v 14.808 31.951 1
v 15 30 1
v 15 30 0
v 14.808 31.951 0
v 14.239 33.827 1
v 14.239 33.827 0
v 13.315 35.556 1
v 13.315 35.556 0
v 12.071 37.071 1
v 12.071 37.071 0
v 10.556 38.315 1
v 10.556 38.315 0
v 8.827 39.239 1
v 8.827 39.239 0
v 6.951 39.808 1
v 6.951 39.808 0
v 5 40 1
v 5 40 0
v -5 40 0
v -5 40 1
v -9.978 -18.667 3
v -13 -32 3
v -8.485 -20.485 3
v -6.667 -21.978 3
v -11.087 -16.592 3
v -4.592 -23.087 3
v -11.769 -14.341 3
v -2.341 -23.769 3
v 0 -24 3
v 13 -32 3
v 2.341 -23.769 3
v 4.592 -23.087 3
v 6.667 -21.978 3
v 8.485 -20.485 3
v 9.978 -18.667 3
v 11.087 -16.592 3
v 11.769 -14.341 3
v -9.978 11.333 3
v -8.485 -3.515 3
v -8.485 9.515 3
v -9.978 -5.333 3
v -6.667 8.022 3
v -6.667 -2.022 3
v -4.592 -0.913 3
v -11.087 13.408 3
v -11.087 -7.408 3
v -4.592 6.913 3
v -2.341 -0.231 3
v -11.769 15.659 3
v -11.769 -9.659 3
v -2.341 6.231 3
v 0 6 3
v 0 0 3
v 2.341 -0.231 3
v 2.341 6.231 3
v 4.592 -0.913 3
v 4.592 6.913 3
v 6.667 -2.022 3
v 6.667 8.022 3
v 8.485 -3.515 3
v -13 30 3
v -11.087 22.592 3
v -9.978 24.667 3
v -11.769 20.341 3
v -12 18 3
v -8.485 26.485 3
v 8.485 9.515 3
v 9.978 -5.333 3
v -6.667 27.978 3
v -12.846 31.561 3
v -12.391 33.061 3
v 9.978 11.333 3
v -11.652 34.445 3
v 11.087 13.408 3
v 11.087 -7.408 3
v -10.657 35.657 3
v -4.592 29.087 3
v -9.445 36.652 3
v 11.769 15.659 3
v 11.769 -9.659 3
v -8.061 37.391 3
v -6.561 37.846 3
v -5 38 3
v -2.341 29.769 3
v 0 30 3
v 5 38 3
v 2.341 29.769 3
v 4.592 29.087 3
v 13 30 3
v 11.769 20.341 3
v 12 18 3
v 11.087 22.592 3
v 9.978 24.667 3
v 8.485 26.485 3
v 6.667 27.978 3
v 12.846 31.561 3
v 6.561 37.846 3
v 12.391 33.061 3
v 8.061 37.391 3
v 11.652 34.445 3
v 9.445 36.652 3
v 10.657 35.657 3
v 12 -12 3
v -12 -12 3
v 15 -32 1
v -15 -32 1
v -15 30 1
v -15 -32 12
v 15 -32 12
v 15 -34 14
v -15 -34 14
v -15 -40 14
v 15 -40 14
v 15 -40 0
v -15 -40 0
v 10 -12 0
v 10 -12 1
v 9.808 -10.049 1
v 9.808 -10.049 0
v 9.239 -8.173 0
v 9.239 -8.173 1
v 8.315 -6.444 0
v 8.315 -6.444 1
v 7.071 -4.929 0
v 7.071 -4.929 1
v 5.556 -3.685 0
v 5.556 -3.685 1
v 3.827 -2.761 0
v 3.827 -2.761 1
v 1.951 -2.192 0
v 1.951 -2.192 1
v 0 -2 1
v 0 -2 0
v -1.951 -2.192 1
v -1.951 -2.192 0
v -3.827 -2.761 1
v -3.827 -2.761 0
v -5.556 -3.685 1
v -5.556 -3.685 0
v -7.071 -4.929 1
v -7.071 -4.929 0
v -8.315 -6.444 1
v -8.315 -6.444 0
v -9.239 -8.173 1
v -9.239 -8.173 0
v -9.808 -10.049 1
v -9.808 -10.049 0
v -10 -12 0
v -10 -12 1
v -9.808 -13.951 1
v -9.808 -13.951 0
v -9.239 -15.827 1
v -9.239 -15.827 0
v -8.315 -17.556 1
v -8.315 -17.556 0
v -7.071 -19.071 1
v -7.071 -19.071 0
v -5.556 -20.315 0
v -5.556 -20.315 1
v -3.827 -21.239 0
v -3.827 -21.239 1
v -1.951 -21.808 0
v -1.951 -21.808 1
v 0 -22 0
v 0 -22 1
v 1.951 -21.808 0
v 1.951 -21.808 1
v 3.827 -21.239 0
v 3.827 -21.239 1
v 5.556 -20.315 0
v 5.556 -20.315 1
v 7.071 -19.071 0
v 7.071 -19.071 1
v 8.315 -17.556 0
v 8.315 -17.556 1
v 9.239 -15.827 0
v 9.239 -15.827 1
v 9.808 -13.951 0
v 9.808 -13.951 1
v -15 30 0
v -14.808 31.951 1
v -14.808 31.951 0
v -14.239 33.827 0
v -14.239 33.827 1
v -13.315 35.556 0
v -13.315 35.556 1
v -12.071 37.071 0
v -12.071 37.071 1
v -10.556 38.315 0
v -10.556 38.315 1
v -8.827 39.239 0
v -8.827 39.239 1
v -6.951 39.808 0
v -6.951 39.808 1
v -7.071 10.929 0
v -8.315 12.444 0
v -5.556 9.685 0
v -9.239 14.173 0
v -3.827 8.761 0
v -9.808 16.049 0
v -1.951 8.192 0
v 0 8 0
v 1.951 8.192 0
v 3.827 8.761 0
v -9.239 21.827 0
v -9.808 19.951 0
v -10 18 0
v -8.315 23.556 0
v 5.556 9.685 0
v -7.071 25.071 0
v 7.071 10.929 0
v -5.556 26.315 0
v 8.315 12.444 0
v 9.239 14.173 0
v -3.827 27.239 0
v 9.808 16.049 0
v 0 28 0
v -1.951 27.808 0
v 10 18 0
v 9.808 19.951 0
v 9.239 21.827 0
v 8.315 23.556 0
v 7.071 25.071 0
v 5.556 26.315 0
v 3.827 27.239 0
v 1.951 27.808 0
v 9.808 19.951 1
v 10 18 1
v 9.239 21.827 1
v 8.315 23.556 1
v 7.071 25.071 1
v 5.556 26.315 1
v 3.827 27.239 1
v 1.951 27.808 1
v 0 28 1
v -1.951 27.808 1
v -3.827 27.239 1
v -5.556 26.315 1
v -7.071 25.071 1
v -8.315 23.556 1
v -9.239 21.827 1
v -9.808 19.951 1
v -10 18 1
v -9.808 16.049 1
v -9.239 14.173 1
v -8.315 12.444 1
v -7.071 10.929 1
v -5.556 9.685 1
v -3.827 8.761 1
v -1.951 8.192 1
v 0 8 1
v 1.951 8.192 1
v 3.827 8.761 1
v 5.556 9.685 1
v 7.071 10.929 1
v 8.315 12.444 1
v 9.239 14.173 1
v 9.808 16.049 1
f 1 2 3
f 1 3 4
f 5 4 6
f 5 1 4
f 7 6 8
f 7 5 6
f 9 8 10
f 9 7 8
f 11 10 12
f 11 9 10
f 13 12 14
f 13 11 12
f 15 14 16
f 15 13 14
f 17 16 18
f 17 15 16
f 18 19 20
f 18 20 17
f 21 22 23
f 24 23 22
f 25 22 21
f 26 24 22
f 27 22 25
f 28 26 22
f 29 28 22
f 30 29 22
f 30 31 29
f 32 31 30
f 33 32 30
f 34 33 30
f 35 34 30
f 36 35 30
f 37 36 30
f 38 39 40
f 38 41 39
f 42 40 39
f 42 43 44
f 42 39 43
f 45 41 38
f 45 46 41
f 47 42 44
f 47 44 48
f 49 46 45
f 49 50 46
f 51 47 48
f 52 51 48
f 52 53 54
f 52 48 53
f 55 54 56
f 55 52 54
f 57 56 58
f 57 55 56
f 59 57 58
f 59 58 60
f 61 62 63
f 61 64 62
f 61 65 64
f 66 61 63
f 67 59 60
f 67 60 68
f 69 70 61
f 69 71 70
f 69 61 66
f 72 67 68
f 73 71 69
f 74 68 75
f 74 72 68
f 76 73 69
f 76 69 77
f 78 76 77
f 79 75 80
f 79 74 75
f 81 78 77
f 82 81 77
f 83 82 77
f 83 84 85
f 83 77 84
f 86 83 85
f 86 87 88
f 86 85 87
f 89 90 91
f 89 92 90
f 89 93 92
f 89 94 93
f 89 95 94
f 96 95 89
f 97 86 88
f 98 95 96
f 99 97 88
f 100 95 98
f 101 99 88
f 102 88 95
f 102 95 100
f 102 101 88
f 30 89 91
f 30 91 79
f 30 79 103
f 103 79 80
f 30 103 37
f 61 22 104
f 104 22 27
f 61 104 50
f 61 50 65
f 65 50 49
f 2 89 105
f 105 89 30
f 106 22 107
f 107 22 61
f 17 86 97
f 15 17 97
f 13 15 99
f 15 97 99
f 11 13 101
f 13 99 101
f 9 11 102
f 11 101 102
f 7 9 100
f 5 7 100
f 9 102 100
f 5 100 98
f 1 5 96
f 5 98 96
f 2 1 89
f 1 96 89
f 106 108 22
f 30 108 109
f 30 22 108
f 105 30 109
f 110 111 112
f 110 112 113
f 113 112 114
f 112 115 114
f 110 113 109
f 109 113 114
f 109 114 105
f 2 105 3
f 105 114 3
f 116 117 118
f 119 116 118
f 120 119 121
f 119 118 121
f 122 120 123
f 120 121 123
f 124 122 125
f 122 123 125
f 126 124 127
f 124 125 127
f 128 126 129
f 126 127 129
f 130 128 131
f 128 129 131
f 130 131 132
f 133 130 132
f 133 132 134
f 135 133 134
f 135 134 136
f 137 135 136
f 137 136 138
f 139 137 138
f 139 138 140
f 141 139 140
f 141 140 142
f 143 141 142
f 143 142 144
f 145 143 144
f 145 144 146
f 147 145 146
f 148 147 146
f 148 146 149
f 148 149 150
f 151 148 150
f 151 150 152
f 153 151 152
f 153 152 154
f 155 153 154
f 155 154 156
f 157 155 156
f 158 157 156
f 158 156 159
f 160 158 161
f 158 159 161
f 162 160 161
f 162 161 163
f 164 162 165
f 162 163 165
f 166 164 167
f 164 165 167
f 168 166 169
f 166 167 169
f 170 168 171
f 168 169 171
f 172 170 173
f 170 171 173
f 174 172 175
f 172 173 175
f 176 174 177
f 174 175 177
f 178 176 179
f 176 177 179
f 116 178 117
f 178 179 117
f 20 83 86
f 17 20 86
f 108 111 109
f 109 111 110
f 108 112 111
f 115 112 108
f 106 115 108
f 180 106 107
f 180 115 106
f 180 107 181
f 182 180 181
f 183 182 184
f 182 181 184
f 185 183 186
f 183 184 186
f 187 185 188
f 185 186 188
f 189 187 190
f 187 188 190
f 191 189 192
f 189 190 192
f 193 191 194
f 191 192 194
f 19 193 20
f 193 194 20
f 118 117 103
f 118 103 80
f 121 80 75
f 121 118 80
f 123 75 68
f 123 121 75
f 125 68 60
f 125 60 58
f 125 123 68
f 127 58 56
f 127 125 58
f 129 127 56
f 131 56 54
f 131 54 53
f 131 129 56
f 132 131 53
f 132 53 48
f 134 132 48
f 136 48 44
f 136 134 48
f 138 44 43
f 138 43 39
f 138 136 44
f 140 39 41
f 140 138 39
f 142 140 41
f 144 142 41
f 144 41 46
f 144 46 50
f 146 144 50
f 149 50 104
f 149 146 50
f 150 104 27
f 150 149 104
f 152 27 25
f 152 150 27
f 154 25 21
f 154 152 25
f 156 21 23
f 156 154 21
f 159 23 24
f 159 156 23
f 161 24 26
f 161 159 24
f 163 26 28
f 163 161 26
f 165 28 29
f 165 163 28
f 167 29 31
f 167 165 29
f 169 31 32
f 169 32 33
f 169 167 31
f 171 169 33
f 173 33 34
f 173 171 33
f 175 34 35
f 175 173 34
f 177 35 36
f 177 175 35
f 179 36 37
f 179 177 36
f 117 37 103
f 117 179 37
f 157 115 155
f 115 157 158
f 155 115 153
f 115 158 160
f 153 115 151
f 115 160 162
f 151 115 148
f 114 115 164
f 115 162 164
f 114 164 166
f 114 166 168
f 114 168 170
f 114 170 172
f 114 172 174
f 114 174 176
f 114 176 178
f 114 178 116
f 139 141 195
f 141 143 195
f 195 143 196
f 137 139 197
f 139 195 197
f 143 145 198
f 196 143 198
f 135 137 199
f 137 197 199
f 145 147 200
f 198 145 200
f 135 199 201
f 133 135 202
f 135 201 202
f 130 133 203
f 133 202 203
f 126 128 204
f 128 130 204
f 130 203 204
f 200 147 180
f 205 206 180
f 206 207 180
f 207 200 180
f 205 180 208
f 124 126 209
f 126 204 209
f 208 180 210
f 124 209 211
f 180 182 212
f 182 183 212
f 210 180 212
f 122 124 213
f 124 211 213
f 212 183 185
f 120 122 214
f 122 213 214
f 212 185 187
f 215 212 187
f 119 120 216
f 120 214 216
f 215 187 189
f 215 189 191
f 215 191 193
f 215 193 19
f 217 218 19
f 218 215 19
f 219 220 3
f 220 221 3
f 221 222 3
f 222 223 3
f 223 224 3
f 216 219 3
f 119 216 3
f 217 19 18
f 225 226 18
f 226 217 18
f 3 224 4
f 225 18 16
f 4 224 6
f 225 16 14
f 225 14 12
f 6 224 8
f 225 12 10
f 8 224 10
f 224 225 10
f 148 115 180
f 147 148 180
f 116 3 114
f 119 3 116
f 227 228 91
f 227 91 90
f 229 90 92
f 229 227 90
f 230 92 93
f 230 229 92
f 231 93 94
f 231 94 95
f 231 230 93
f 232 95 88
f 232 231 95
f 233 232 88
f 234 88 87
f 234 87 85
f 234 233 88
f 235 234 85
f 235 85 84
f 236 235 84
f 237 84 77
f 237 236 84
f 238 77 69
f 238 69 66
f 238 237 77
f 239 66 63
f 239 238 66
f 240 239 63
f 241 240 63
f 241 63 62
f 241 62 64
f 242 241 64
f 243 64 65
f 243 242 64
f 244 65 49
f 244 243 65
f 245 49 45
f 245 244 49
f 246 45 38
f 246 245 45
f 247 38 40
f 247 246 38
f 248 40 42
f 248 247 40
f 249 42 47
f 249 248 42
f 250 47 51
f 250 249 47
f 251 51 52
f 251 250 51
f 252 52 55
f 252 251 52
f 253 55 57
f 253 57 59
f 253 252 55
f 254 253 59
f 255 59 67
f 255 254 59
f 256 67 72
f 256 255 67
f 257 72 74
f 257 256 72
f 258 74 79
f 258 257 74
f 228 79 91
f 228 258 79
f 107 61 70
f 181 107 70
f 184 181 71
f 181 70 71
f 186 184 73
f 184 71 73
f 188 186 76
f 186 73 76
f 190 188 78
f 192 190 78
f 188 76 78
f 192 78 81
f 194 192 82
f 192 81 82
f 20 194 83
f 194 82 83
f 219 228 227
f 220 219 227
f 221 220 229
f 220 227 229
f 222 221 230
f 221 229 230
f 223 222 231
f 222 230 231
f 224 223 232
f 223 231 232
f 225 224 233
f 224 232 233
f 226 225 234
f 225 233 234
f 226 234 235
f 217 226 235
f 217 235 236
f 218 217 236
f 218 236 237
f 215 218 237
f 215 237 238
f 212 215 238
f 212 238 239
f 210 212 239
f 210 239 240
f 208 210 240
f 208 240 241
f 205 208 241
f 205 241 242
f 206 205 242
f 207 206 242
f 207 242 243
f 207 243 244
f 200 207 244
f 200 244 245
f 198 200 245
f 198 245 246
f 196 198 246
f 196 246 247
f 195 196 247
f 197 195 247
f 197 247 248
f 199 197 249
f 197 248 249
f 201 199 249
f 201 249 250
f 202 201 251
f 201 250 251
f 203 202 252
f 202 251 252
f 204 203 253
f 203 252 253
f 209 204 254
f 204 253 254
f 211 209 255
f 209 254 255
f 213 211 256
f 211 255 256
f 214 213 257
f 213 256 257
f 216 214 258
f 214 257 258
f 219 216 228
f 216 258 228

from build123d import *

# Parameters (mm, degrees)
F0_W     = 30
F0_H     = 80
F1_DEPTH = 3
F2_W     = 30
F2_H     = 8
F3_DEPTH = 11
F4_R     = 10
F5_R     = 10
F6_DEPTH = 3.001
F7_SIZE  = 2


with BuildPart() as f1:
    # F0 (on Top) → F1 (new body)
    with BuildSketch(Plane.XY):
        Rectangle(F0_W, F0_H)
    extrude(amount=F1_DEPTH)

    # F2 (on face) → F3 (join)
    with BuildSketch(Plane.XY.offset(3)):
        with Locations((0, -36)):
            Rectangle(F2_W, F2_H)
    extrude(amount=F3_DEPTH)

    # F4
    f4_edges = [f1.edges().sort_by_distance(p)[0] for p in [
        (-15, 40, 1.5),
        (15, 40, 1.5),
    ]]
    fillet(f4_edges, radius=F4_R)

    # F5 (on face) → F6 (cut, through all)
    with BuildSketch(Plane.XY.offset(3)):
        with Locations((0, 18)):
            Circle(F5_R)
        with Locations((0, -12)):
            Circle(F5_R)
    extrude(amount=-F6_DEPTH, mode=Mode.SUBTRACT)

    # F7
    f7_edges = [f1.edges().sort_by_distance(p)[0] for p in [
        (0, -32, 14),
        (-15, -1, 3),
        (-10, 18, 3),
        (-10, -12, 3),
    ]]
    chamfer(f7_edges, length=F7_SIZE)


solid = f1.part
